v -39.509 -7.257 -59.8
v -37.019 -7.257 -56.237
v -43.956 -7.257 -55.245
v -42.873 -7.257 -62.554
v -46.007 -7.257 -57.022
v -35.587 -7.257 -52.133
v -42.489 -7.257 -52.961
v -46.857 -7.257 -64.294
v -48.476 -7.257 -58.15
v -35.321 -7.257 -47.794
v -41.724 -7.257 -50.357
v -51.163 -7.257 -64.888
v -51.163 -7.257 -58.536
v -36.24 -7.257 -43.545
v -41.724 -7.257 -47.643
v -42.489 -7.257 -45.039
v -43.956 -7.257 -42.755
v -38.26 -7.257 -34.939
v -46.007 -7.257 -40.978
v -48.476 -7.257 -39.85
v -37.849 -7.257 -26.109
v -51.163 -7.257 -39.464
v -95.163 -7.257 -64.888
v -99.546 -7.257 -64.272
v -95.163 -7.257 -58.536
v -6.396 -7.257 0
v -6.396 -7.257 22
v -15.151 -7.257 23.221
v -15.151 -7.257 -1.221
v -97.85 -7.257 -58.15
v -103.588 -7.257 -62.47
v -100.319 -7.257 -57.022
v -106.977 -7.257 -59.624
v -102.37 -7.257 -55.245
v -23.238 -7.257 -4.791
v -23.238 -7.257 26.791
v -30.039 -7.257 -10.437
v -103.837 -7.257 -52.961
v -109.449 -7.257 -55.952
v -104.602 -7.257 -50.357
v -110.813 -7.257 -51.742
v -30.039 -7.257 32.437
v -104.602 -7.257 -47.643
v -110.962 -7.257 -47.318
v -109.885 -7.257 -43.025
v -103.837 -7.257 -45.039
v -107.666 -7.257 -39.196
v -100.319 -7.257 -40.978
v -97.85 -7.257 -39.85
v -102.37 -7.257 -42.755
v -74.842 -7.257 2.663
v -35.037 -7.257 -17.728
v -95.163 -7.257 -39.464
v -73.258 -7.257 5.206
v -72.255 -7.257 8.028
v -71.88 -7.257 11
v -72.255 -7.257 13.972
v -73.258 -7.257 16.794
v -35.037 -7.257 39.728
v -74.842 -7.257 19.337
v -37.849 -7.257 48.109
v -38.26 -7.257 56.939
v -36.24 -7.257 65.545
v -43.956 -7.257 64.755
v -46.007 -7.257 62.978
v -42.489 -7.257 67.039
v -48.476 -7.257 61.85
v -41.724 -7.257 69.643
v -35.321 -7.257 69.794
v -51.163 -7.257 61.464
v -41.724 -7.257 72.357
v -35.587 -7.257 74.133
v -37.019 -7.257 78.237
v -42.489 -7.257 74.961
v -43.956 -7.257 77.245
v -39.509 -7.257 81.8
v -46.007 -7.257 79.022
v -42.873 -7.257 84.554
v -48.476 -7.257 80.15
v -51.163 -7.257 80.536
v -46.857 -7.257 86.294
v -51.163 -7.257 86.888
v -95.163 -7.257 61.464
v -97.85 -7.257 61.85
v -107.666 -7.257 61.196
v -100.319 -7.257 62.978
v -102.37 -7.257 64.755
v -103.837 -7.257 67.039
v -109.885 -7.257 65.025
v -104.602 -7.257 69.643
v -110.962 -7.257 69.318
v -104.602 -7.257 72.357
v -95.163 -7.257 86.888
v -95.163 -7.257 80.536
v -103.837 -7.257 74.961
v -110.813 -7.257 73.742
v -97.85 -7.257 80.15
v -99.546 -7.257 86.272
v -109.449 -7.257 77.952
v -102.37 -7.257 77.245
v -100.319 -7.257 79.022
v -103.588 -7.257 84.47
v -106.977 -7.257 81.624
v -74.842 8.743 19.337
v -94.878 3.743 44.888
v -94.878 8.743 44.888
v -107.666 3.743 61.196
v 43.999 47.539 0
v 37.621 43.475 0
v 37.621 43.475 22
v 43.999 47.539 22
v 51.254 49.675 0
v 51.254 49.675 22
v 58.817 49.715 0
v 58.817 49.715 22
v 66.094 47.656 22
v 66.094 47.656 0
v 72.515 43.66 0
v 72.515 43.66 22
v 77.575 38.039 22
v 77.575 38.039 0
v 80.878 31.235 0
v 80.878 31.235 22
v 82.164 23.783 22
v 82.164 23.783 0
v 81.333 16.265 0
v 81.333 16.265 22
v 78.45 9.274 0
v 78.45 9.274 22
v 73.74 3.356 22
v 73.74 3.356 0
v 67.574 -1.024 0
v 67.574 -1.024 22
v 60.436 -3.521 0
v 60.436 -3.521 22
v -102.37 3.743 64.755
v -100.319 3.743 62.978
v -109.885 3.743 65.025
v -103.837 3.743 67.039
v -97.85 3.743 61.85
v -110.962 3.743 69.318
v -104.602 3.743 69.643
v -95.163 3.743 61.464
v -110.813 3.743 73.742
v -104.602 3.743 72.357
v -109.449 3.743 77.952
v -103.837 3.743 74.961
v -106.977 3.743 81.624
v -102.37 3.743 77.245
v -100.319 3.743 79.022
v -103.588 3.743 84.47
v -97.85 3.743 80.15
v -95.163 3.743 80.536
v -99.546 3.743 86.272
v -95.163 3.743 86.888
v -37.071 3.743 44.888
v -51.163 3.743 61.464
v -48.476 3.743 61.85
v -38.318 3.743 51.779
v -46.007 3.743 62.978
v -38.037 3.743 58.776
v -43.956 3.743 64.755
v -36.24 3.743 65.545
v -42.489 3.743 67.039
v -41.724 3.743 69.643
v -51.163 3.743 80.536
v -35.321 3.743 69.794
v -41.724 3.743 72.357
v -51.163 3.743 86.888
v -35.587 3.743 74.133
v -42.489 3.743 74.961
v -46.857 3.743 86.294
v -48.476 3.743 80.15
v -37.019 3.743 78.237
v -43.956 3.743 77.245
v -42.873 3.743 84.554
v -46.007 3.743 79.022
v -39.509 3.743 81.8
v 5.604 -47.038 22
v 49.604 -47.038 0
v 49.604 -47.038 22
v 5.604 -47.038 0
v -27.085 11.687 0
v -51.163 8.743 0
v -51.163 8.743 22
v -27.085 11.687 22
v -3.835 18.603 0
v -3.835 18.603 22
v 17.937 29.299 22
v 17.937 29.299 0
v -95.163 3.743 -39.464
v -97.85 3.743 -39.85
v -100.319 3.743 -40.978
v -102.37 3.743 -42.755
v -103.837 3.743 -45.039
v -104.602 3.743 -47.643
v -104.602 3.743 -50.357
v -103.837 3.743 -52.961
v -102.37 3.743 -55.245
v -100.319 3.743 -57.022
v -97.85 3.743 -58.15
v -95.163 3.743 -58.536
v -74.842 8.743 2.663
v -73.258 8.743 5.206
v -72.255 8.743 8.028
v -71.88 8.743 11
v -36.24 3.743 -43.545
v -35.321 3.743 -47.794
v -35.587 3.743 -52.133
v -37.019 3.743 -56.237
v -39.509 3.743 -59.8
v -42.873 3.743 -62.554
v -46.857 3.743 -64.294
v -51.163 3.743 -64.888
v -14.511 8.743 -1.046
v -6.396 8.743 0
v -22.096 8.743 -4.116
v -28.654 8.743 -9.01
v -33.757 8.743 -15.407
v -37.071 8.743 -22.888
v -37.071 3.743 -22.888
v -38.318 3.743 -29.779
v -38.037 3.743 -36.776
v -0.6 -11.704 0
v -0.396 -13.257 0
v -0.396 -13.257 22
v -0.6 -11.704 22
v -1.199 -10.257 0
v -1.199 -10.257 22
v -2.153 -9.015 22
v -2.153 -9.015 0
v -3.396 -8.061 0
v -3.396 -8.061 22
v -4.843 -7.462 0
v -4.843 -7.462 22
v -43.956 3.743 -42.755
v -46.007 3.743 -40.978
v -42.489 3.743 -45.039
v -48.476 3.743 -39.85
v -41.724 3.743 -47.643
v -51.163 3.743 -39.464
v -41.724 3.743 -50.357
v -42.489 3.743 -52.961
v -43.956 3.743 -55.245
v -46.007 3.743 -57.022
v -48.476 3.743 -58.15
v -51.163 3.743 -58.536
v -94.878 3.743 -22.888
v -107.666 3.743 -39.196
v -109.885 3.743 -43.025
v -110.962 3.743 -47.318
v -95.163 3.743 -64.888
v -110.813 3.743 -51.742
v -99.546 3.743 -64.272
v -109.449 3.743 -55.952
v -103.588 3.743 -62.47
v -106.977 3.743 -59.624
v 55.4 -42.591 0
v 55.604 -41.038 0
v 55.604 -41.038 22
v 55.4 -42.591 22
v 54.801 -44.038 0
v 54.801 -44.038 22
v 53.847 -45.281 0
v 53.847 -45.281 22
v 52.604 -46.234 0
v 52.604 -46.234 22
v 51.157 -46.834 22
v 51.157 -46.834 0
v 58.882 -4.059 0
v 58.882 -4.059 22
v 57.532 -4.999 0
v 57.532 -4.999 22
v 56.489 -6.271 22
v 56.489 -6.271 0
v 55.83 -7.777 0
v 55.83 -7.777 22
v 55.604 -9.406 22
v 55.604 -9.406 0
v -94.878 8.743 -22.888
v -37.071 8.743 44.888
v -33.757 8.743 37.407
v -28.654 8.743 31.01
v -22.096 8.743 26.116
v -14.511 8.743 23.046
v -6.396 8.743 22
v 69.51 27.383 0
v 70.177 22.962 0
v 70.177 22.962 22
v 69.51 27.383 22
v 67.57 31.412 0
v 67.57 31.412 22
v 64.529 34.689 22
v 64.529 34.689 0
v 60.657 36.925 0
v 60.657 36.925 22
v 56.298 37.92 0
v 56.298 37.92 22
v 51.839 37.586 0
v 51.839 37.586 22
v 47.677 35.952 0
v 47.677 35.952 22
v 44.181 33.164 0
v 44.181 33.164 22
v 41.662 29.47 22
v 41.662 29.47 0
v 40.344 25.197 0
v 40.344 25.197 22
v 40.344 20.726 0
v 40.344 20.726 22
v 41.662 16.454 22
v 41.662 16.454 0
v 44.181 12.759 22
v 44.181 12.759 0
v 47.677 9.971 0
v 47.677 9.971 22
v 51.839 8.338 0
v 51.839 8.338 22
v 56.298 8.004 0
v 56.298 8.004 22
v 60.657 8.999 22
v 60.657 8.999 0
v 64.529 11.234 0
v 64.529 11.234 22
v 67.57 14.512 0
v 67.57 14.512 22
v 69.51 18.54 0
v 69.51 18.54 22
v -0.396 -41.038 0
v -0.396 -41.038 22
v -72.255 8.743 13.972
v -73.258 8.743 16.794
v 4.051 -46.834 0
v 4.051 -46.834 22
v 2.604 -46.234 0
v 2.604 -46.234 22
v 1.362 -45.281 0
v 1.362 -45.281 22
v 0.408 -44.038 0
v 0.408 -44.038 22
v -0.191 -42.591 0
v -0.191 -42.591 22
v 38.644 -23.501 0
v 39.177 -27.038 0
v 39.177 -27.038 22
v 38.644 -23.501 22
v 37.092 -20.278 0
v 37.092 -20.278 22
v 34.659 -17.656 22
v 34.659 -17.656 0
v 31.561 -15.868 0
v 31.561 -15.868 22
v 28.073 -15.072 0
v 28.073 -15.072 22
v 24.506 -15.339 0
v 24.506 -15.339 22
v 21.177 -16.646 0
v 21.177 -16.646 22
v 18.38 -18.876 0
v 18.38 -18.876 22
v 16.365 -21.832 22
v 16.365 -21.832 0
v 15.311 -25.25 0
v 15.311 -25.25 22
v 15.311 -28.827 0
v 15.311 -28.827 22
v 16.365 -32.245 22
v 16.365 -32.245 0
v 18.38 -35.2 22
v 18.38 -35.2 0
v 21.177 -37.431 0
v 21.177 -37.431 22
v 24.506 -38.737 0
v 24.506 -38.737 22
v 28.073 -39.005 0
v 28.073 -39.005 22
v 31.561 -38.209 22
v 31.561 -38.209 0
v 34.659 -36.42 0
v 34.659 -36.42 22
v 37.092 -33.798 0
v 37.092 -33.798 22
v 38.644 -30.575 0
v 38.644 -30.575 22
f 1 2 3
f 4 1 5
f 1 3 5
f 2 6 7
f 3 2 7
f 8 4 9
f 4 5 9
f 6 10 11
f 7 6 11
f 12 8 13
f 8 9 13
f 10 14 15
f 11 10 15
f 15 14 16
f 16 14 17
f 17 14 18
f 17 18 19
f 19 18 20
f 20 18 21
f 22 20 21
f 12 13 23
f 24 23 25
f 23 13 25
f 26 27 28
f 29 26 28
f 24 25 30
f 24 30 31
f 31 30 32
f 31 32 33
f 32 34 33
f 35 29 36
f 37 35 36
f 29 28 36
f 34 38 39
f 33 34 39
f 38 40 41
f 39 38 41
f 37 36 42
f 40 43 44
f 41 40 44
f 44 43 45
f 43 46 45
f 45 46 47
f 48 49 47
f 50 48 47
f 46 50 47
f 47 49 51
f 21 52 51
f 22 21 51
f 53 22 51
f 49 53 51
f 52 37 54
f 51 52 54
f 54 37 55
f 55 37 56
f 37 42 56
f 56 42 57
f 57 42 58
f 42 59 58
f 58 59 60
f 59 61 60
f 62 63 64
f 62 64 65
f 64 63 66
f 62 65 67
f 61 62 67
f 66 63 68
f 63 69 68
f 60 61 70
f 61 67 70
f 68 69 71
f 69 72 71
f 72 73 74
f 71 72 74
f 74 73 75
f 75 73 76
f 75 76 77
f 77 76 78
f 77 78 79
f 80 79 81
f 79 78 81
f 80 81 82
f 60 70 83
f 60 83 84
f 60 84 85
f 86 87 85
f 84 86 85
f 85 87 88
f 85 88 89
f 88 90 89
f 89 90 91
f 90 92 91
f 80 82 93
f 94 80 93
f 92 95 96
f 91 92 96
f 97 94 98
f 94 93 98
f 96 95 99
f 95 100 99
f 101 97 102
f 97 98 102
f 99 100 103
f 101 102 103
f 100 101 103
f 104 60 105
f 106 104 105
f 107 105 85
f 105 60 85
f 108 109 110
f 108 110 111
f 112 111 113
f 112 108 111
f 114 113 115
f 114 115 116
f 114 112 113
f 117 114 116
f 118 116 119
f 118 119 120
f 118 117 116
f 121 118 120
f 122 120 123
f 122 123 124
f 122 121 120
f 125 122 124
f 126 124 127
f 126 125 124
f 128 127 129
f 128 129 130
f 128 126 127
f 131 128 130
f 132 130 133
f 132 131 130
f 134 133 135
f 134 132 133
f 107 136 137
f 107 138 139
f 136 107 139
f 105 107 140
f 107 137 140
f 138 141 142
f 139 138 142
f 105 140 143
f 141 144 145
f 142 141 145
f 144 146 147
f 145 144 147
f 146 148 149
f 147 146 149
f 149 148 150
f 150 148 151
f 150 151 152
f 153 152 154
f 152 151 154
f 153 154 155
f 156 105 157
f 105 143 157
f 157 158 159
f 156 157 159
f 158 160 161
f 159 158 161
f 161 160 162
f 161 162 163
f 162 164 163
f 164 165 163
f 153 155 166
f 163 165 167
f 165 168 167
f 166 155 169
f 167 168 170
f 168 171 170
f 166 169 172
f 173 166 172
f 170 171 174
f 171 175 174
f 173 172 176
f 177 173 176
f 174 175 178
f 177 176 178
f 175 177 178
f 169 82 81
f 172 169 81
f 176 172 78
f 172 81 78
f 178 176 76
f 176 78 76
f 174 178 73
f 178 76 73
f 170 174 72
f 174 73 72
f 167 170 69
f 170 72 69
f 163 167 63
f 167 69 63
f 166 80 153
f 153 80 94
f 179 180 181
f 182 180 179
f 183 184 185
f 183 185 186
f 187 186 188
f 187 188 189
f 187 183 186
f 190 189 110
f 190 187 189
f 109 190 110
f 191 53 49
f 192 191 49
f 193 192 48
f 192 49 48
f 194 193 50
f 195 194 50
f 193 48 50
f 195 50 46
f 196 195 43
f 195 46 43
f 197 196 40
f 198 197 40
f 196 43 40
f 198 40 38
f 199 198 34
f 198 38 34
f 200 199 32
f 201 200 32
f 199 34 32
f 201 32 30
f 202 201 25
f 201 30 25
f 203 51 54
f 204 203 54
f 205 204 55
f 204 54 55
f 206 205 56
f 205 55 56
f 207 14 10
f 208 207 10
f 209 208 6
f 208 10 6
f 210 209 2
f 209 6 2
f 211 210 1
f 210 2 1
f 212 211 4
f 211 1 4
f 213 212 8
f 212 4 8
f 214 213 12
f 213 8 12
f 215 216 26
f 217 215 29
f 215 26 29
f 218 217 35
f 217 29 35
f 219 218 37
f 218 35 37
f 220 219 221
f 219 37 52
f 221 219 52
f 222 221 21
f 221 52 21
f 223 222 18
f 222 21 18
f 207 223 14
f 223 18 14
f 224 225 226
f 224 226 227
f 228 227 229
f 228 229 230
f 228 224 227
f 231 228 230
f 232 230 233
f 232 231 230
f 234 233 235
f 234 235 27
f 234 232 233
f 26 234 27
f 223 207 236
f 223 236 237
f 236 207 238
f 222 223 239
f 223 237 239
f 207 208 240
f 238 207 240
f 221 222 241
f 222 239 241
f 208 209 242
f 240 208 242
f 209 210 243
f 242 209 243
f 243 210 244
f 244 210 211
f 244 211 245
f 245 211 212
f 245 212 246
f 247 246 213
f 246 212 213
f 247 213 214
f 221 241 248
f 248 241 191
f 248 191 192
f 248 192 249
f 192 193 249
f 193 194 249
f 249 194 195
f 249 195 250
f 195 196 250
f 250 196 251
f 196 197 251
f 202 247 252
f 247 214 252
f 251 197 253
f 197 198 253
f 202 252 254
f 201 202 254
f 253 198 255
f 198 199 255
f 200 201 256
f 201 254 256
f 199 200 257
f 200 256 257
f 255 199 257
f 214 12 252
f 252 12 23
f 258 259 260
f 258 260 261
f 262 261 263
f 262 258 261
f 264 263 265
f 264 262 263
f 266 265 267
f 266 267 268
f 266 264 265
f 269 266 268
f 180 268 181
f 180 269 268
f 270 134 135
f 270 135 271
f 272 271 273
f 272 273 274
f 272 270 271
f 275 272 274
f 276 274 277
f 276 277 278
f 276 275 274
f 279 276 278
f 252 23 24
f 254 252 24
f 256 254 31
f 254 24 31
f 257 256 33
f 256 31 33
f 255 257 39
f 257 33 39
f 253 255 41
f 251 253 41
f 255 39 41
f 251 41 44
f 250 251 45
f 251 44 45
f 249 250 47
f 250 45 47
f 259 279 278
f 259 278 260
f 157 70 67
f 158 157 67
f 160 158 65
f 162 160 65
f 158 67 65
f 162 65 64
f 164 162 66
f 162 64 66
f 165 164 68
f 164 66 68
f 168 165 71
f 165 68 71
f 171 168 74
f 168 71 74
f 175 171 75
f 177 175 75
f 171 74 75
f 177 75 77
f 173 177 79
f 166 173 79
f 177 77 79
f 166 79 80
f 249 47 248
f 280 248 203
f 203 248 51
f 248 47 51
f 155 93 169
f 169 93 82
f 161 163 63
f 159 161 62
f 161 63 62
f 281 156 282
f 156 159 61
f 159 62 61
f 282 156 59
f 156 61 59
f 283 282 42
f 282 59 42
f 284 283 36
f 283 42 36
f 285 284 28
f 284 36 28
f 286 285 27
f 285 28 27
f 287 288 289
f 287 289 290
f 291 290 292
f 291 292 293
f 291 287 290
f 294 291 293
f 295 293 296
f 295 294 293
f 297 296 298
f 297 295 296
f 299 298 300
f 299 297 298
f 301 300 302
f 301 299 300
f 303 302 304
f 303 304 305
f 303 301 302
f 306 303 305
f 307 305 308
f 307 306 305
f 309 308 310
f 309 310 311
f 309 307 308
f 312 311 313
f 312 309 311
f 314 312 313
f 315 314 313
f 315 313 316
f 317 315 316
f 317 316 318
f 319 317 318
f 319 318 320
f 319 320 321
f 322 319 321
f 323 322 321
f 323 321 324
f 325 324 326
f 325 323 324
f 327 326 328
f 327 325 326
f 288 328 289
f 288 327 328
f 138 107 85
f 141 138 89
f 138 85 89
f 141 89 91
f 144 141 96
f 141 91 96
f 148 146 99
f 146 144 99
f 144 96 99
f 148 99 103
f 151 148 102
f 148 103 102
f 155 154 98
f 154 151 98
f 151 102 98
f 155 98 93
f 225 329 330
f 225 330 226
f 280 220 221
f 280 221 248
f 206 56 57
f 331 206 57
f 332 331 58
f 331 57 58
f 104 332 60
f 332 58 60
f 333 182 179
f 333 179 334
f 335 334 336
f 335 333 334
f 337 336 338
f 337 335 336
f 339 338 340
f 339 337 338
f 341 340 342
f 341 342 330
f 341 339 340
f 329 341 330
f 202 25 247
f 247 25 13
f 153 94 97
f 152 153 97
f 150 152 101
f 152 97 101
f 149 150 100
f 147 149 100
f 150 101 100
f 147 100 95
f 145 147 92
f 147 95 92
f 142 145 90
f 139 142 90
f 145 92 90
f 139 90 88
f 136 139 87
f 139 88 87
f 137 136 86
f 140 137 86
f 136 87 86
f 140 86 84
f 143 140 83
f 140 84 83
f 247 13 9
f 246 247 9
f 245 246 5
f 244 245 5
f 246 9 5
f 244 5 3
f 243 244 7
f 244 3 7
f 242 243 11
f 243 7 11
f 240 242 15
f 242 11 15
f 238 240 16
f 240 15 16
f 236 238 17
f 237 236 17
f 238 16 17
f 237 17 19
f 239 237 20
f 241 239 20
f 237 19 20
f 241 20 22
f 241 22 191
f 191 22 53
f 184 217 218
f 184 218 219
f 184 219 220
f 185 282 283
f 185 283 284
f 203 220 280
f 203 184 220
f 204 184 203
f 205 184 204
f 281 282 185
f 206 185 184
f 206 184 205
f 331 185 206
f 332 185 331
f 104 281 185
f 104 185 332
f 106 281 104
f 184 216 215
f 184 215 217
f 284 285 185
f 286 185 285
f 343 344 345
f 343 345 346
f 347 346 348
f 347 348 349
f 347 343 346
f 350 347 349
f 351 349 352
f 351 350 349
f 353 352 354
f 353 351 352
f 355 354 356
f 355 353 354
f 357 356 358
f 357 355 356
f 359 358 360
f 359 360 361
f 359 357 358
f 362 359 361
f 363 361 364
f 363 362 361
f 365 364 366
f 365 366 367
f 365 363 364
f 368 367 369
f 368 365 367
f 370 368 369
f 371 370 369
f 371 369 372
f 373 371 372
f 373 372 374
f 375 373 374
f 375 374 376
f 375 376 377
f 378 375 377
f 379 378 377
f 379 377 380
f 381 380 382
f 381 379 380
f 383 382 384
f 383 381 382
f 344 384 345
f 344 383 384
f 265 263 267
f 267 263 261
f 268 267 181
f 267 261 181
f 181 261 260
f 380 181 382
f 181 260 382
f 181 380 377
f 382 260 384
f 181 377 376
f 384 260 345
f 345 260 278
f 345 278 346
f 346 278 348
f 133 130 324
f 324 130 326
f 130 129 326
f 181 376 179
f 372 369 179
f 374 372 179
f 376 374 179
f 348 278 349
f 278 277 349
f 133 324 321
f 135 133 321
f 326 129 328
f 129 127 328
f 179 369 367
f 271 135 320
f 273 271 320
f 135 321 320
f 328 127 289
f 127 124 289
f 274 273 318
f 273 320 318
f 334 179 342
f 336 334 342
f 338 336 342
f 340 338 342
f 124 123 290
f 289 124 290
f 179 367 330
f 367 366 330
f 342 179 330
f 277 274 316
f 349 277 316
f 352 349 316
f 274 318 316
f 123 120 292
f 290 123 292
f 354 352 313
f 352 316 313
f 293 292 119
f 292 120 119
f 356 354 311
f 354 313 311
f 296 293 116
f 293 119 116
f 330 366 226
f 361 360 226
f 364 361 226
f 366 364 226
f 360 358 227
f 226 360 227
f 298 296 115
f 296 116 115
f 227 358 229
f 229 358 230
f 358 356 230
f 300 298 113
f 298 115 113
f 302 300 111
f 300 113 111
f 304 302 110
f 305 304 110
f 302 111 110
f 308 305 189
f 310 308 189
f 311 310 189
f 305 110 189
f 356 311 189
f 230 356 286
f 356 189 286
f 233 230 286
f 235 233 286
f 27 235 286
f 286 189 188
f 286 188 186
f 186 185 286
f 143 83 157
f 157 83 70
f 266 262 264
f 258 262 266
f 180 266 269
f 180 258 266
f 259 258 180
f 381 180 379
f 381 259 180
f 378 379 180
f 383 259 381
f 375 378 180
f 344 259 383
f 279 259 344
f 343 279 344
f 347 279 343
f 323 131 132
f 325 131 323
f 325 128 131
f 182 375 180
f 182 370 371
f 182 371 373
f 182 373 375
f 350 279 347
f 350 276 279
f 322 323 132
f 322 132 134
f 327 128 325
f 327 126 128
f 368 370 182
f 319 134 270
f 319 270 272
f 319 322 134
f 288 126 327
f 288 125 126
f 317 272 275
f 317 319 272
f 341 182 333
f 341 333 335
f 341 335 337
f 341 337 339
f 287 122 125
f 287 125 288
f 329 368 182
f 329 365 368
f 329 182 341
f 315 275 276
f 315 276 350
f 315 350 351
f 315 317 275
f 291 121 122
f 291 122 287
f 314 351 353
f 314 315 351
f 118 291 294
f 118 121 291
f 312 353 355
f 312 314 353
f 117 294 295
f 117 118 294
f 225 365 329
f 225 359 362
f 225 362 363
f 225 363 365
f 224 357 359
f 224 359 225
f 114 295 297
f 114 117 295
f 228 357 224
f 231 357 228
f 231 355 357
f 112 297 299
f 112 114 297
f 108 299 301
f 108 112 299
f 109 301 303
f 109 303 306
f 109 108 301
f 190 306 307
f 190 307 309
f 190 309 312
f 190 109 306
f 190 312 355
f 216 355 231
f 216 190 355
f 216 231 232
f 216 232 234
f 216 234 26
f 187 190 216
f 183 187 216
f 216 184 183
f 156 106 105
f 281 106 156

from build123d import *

# Parameters (mm, degrees)
SKETCH1_R           = 15
SKETCH1_R_2         = 12
BOSS_EXTRUDE1_DEPTH = 22
BOSS_EXTRUDE3_DEPTH = 16
SKETCH9_W           = 75.776541305
SKETCH9_H           = 5
CUT_EXTRUDE1_DEPTH  = 42
SKETCH10_W          = 75.776541305
SKETCH10_H          = 5
CUT_EXTRUDE2_DEPTH  = 42


with BuildPart() as part:
    # Sketch1 → Boss-Extrude1 (new body)
    with BuildSketch(Plane.XY):
        with BuildLine():
            Line((55.604384426, -9.406151738), (55.604384426, -41.038199431))
            ThreePointArc((55.604384426, -41.038199431), (53.847025113, -45.280840118), (49.604384426, -47.038199431))
            Line((49.604384426, -47.038199431), (5.604384426, -47.038199431))
            ThreePointArc((5.604384426, -47.038199431), (1.361743739, -45.280840118), (-0.395615574, -41.038199431))
            Line((-0.395615574, -41.038199431), (-0.395615574, -13.257389991))
            ThreePointArc((-0.395615574, -13.257389991), (-2.152974887, -9.014749304), (-6.395615574, -7.257389991))
            Line((-6.395615574, -7.257389991), (-51.162903124, -7.257389991))
            Line((-51.162903124, -7.257389991), (-51.162903124, 8.742610009))
            ThreePointArc((-51.162903124, 8.742610009), (-3.834966472, 18.603456094), (37.620760235, 43.474977893))
            ThreePointArc((37.620760235, 43.474977893), (79.465755498, 34.75331261), (60.435706944, -3.5210695))
            ThreePointArc((60.435706944, -3.5210695), (56.966924728, -5.599057366), (55.604384426, -9.406151738))
        make_face()
        with Locations((55.176658278, 22.961800569)):
            Circle(SKETCH1_R, mode=Mode.SUBTRACT)
        with Locations((27.176658278, -27.038199431)):
            Circle(SKETCH1_R_2, mode=Mode.SUBTRACT)
    extrude(amount=BOSS_EXTRUDE1_DEPTH)

    # Sketch7 → Boss-Extrude3 (add)
    with BuildSketch(Plane.XZ.offset(7.257389991)):
        with BuildLine():
            ThreePointArc((-36.240473941, -43.544887573), (-38.141585084, -58.103978296), (-51.162903124, -64.888270652))
            Line((-51.162903124, -64.888270652), (-95.162903124, -64.888270652))
            ThreePointArc((-95.162903124, -64.888270652), (-109.449332837, -55.952342799), (-107.665731017, -39.196100826))
            Line((-107.665731017, -39.196100826), (-74.842207937, 2.663454503))
            ThreePointArc((-74.842207937, 2.663454503), (-72.680751998, 6.589987728), (-71.87991075, 11))
            ThreePointArc((-71.87991075, 11), (-72.680751998, 15.410012272), (-74.842207937, 19.336545497))
            Line((-74.842207937, 19.336545497), (-107.665731017, 61.196100826))
            ThreePointArc((-107.665731017, 61.196100826), (-109.449332837, 77.952342799), (-95.162903124, 86.888270652))
            Line((-95.162903124, 86.888270652), (-51.162903124, 86.888270652))
            ThreePointArc((-51.162903124, 86.888270652), (-38.141585084, 80.103978296), (-36.240473941, 65.544887573))
            ThreePointArc((-36.240473941, 65.544887573), (-32.791035654, 35.909068602), (-6.395615574, 22))
            Line((-6.395615574, 22), (-51.162903124, 22))
            Line((-51.162903124, 22), (-51.162903124, 0))
            Line((-51.162903124, 0), (-6.395615574, 0))
            ThreePointArc((-6.395615574, 0), (-32.791035654, -13.909068602), (-36.240473941, -43.544887573))
        make_face()
        with BuildLine():
            ThreePointArc((-51.162903124, -58.536156571), (-41.626746553, -49), (-51.162903124, -39.463843429))
            Line((-51.162903124, -39.463843429), (-95.162903124, -39.463843429))
            ThreePointArc((-95.162903124, -39.463843429), (-104.699059695, -49), (-95.162903124, -58.536156571))
            Line((-95.162903124, -58.536156571), (-51.162903124, -58.536156571))
        make_face(mode=Mode.SUBTRACT)
        with BuildLine():
            ThreePointArc((-95.162903124, 80.536156571), (-104.699059695, 71), (-95.162903124, 61.463843429))
            Line((-95.162903124, 61.463843429), (-51.162903124, 61.463843429))
            ThreePointArc((-51.162903124, 61.463843429), (-41.626746553, 71), (-51.162903124, 80.536156571))
            Line((-51.162903124, 80.536156571), (-95.162903124, 80.536156571))
        make_face(mode=Mode.SUBTRACT)
    extrude(amount=-BOSS_EXTRUDE3_DEPTH)

    # Sketch9 → Cut-Extrude1 (cut)
    with BuildSketch(Plane.XY.offset(86.888270652)):
        with Locations((-73.162903125, 6.242610009)):
            Rectangle(SKETCH9_W, SKETCH9_H)
    extrude(amount=-CUT_EXTRUDE1_DEPTH, mode=Mode.SUBTRACT)

    # Sketch10 → Cut-Extrude2 (cut)
    with BuildSketch(Plane(origin=(0, 0, -64.888270652), x_dir=(-1, 0, 0), z_dir=(0, 0, -1))):
        with Locations((73.162903125, 6.242610009)):
            Rectangle(SKETCH10_W, SKETCH10_H)
    extrude(amount=-CUT_EXTRUDE2_DEPTH, mode=Mode.SUBTRACT)


solid = part.part
